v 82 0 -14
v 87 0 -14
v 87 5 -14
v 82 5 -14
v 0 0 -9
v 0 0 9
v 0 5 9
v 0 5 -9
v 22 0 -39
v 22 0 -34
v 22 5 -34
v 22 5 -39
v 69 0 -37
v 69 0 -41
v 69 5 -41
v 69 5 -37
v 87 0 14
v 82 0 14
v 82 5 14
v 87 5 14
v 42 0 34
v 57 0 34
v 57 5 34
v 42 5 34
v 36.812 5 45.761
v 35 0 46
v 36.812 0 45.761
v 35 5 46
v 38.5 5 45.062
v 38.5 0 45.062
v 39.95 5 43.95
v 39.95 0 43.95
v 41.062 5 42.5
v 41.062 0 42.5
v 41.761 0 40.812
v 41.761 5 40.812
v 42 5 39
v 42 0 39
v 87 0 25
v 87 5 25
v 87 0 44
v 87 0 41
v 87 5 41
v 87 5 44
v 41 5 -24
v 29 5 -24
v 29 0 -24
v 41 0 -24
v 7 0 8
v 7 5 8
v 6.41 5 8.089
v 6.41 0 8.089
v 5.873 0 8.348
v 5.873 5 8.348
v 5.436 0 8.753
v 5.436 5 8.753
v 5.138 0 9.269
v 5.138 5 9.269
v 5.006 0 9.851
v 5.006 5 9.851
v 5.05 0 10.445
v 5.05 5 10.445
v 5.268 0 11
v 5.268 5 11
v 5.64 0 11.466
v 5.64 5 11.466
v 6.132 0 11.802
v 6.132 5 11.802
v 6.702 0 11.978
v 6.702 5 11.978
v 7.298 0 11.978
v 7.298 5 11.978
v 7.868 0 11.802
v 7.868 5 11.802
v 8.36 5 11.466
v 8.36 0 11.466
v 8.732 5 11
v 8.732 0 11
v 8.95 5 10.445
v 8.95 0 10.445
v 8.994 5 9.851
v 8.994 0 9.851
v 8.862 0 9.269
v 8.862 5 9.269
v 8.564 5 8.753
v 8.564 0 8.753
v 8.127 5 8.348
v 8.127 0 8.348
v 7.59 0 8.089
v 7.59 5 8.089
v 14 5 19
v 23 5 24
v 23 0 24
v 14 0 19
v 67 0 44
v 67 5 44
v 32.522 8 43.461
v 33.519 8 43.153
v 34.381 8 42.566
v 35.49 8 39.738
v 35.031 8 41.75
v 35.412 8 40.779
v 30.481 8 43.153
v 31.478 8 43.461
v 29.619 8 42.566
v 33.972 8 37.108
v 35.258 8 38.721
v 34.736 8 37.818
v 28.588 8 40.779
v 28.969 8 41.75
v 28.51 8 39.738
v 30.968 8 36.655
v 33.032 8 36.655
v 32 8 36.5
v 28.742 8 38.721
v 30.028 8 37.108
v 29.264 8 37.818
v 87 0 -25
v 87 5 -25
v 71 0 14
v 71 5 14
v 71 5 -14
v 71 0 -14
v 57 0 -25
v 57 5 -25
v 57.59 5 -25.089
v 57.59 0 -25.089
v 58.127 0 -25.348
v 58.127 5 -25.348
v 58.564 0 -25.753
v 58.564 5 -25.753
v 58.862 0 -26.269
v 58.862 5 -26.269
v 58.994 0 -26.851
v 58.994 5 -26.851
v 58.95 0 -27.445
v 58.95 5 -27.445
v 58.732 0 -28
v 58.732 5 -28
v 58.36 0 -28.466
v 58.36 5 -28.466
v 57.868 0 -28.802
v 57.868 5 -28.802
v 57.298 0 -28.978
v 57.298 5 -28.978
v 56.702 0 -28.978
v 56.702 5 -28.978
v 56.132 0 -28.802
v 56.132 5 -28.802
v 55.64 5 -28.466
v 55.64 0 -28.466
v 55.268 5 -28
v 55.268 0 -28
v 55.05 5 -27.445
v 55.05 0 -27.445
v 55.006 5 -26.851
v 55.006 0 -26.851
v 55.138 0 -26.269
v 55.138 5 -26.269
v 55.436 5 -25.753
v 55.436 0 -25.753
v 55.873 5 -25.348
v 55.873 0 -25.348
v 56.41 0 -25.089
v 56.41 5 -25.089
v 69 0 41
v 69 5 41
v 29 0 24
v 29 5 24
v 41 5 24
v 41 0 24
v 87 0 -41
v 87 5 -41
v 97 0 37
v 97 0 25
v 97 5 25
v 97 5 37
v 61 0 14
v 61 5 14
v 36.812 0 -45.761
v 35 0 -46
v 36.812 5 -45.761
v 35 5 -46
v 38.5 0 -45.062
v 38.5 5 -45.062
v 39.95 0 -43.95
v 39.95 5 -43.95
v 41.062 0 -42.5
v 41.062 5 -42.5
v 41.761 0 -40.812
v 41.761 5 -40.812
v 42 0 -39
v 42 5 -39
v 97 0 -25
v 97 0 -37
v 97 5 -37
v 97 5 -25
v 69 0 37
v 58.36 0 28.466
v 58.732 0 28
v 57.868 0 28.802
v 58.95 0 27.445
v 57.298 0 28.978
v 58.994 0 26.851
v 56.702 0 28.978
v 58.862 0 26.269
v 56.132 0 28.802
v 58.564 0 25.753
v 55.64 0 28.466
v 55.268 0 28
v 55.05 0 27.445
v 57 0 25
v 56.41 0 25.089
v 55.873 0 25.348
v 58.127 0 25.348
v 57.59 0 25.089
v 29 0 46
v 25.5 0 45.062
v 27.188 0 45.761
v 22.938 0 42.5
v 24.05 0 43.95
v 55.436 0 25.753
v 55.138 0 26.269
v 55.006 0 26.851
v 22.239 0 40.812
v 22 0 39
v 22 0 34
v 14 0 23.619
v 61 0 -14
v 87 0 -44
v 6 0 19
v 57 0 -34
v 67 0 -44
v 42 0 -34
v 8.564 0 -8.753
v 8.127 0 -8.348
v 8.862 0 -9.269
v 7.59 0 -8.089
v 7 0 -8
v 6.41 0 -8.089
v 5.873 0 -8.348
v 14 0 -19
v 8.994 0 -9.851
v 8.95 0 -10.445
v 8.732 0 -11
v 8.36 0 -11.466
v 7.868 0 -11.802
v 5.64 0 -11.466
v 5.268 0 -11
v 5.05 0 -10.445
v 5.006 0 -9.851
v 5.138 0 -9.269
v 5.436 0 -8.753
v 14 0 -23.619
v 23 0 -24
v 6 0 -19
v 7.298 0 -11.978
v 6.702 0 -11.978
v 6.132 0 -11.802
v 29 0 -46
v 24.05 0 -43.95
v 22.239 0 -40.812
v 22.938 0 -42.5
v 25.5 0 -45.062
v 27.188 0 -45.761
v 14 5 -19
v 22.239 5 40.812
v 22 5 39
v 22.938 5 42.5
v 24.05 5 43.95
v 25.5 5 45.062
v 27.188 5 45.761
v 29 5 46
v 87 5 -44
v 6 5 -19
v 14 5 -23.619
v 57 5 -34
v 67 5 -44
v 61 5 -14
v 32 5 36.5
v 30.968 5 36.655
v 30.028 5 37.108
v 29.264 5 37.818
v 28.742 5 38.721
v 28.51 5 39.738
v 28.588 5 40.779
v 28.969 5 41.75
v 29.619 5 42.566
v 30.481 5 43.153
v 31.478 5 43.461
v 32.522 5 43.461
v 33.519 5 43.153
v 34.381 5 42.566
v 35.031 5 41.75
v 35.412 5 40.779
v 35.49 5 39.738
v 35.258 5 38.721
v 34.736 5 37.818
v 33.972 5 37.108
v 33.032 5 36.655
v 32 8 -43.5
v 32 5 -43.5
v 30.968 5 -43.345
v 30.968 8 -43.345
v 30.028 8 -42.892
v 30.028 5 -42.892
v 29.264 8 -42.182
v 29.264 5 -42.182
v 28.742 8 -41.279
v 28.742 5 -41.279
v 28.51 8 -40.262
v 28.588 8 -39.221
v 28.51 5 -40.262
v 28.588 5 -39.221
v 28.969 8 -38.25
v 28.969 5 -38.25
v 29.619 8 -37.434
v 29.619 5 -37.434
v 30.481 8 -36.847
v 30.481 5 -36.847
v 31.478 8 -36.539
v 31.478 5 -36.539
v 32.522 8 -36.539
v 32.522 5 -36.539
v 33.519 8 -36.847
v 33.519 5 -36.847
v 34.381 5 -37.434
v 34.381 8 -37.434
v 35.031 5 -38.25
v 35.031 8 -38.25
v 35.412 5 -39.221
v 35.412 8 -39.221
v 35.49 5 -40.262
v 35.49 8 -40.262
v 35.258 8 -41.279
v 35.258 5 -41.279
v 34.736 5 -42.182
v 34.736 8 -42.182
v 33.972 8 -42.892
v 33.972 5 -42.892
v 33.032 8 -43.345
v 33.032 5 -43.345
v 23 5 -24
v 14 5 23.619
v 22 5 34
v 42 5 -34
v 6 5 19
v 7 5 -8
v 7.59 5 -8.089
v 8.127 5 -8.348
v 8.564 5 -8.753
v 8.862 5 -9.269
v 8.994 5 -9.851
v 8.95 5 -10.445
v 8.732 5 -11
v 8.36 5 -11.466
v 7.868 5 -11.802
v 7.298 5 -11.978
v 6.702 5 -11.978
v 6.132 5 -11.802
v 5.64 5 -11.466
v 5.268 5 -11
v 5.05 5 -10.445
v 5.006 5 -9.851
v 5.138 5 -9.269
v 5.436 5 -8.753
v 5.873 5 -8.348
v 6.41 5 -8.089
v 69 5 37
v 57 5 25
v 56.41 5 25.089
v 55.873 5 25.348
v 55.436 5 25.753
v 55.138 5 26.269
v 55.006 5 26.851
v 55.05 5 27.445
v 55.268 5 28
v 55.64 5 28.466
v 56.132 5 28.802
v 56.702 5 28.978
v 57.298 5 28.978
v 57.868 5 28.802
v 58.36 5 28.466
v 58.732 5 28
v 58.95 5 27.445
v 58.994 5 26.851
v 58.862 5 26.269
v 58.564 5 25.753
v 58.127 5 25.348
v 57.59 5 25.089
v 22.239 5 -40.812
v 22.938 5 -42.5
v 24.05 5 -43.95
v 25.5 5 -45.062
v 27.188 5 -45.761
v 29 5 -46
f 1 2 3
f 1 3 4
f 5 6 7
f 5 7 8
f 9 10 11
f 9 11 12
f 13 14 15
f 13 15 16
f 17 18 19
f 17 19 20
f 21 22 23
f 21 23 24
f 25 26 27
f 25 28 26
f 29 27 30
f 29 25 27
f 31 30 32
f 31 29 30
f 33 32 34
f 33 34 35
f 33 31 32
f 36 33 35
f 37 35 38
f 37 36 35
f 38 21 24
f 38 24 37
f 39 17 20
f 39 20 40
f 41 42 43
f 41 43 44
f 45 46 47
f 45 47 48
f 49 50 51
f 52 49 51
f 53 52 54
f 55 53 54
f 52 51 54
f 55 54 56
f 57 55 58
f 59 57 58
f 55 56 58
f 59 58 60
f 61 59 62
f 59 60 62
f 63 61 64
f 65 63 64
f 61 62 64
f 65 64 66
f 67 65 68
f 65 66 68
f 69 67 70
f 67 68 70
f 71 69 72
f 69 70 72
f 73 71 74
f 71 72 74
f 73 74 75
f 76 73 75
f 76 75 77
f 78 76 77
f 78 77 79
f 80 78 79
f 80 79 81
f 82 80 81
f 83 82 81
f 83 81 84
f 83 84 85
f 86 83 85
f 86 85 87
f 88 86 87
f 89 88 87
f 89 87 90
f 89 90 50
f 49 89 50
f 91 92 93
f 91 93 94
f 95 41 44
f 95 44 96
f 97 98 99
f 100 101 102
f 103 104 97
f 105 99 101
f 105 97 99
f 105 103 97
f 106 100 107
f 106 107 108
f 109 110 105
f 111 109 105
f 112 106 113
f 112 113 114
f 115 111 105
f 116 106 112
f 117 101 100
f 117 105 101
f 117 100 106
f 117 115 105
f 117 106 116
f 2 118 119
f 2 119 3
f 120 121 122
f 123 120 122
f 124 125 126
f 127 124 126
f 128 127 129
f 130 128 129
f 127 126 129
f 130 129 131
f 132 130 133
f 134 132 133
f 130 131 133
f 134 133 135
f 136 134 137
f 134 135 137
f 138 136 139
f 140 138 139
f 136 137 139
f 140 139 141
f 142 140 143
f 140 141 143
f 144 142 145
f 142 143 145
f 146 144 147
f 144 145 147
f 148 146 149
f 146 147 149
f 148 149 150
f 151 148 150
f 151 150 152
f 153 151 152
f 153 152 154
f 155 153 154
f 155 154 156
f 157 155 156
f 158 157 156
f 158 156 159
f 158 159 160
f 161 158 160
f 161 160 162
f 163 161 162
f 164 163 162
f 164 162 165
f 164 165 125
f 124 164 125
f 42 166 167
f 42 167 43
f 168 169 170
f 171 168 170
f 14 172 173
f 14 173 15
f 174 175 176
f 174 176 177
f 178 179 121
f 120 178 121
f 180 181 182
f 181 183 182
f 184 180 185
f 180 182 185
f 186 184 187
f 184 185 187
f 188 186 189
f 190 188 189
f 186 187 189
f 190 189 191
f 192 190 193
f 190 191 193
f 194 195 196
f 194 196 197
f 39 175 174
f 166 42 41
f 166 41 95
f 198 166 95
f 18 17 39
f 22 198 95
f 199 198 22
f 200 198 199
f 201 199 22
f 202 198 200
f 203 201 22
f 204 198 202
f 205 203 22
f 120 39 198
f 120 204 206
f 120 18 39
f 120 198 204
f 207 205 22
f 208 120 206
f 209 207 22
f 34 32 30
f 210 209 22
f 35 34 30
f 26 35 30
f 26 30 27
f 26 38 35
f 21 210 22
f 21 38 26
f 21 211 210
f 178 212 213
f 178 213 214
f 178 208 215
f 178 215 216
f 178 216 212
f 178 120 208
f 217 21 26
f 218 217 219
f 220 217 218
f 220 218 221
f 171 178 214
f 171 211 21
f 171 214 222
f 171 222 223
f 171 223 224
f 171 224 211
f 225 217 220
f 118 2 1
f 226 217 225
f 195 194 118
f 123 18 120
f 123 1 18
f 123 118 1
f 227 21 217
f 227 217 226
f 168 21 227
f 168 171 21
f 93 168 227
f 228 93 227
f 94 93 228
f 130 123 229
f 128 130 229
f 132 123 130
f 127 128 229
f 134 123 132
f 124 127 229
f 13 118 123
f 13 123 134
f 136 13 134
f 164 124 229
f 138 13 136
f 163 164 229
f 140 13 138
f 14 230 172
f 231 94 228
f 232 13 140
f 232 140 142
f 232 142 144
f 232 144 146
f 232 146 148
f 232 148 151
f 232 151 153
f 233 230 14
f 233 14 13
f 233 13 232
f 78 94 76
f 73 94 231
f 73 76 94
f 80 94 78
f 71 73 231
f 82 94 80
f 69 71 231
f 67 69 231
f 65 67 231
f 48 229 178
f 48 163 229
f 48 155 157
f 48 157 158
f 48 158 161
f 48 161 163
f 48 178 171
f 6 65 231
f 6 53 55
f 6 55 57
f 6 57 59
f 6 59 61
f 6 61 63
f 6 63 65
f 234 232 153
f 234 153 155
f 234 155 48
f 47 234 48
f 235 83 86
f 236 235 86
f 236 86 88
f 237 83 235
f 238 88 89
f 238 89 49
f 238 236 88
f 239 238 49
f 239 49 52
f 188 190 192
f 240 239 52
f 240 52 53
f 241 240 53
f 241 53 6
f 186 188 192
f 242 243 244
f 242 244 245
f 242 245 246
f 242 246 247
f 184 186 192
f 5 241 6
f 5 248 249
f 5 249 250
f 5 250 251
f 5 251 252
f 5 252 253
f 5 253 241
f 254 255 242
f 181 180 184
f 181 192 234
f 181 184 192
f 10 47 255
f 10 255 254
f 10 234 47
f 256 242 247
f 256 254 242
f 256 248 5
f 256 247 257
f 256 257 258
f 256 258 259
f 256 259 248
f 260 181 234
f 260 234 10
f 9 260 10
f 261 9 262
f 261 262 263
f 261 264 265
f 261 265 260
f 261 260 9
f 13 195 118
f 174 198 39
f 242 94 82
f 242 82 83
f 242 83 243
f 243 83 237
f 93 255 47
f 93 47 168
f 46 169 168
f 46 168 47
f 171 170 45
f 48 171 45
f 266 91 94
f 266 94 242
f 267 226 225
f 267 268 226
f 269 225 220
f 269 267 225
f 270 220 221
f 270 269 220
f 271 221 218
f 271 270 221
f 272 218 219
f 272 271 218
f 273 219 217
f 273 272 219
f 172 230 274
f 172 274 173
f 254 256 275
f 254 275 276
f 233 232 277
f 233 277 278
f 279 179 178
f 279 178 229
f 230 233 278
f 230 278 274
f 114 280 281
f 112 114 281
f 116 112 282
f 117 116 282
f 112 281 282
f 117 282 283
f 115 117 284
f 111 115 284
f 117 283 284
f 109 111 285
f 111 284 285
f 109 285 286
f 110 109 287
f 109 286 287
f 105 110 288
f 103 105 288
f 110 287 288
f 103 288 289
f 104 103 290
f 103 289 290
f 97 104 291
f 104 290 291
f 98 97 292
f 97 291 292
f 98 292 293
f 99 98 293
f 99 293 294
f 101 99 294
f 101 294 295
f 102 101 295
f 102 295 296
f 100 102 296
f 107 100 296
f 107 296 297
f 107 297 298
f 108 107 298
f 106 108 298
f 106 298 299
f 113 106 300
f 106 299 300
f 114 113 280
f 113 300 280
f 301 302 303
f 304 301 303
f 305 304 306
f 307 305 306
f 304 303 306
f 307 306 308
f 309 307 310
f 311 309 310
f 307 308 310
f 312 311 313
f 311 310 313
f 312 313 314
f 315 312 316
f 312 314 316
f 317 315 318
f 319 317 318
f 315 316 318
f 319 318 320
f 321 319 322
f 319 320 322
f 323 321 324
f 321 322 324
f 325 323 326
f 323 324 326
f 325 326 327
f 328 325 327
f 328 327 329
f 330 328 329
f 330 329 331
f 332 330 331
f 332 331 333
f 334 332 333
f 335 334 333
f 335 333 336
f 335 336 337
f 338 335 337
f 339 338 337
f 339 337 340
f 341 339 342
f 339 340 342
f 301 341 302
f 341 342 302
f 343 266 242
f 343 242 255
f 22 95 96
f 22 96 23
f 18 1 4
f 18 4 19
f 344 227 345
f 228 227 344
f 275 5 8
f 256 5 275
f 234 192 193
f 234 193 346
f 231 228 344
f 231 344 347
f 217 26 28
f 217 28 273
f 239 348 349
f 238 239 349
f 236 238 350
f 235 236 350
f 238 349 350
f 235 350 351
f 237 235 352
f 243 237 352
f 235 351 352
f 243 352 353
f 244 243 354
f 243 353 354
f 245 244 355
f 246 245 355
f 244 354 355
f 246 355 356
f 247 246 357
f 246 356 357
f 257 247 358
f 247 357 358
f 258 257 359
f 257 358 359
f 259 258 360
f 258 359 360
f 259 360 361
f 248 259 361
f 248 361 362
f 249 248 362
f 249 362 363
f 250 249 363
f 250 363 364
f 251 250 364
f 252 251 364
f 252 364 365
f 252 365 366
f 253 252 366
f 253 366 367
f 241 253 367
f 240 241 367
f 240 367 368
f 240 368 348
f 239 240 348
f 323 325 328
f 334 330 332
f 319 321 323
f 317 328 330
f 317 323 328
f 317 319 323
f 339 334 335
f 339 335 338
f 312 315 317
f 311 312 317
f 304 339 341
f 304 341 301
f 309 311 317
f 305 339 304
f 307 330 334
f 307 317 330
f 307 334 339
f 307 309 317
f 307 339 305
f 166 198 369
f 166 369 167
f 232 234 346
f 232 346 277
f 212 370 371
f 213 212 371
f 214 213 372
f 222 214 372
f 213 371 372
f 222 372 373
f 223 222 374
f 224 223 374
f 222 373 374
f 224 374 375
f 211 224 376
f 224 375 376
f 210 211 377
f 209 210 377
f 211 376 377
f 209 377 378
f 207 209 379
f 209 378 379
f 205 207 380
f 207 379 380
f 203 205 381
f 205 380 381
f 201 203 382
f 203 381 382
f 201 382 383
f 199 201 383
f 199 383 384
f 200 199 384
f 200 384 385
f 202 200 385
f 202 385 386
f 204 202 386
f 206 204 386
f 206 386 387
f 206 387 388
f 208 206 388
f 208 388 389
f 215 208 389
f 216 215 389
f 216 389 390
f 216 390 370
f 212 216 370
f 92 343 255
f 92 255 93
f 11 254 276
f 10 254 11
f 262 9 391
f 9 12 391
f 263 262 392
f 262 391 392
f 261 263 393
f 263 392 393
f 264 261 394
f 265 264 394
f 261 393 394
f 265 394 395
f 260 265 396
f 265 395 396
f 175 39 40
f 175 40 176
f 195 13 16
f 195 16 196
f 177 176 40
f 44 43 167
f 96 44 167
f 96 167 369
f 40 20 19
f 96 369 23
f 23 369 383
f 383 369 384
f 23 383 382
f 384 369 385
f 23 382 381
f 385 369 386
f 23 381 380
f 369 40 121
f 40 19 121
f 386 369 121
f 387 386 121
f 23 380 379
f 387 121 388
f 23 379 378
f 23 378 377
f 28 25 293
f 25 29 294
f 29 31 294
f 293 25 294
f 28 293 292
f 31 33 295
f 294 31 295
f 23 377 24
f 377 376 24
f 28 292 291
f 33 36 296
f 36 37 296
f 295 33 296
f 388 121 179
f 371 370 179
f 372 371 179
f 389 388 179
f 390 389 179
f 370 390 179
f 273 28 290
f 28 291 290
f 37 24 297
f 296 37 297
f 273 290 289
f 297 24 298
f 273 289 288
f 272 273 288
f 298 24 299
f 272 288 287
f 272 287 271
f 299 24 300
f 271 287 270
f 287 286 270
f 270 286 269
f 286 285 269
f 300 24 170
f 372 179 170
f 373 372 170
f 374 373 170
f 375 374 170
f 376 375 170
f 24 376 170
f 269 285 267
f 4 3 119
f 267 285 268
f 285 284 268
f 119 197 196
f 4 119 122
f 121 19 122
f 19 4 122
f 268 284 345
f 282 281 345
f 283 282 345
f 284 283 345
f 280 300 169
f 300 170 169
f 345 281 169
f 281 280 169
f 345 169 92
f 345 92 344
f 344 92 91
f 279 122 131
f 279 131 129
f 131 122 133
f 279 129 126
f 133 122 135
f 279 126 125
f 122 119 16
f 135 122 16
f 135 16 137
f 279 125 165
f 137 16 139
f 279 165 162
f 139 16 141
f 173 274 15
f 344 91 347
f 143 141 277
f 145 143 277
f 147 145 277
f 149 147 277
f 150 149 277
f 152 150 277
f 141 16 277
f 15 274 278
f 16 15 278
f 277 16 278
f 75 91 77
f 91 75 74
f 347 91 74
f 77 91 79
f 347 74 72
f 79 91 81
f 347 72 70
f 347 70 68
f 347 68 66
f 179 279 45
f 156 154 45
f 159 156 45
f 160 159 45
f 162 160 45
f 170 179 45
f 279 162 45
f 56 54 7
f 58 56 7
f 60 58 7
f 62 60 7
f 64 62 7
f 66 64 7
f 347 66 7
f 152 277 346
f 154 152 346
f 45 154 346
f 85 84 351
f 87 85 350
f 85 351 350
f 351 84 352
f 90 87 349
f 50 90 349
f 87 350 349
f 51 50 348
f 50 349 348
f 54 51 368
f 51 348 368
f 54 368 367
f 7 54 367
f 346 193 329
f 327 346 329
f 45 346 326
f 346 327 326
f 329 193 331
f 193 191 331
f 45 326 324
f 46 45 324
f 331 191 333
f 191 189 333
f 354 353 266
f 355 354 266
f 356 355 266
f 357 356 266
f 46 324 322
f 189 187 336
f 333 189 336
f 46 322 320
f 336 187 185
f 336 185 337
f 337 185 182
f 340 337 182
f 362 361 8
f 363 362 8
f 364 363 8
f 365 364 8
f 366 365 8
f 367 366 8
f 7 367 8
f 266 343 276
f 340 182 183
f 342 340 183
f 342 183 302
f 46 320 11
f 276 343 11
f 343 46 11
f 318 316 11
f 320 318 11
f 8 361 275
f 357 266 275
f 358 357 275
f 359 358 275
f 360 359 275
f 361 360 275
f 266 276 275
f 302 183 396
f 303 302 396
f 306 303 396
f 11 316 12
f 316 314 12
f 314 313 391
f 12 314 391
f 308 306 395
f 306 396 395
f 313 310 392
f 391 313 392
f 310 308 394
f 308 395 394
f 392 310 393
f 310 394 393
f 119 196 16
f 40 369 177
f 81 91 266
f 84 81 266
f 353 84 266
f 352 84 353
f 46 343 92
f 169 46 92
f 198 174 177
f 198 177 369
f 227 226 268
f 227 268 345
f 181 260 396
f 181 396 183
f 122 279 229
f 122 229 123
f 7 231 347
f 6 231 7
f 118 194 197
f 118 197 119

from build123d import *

# Parameters (mm, degrees)
EXTRUDE_1_DEPTH     = 5
SKETCH_2_R          = 2
SKETCH_2_W          = 12
SKETCH_2_H          = 48
SKETCH_2_W_2        = 10
SKETCH_2_H_2        = 28
CUT_EXTRUDE_1_DEPTH = 44
SKETCH_3_R          = 3.5
EXTRUDE_2_DEPTH     = 3
FILLET_1_R          = 7


with BuildPart() as part:
    # 草图1 → 凸台-拉伸1 (new body)
    with BuildSketch(Plane(origin=(0, 0, 0), x_dir=(1, 0, 0), z_dir=(0, 1, 0))):
        Polygon((0, -9), (0, 9), (6, 19), (14, 23.618802154), (22, 34), (22, 46), (42, 46), (42, 34), (57, 34), (67, 44), (87, 44), (87, 41), (69, 41), (69, 37), (97, 37), (97, 25), (87, 25), (87, 14), (82, 14), (82, -14), (87, -14), (87, -25), (97, -25), (97, -37), (69, -37), (69, -41), (87, -41), (87, -44), (67, -44), (57, -34), (42, -34), (42, -46), (22, -46), (22, -34), (14, -23.618802154), (6, -19), align=None)
    extrude(amount=EXTRUDE_1_DEPTH)

    # 草图2 → 切除-拉伸1 (cut)
    with BuildSketch(Plane(origin=(0, 5, 0), x_dir=(1, 0, 0), z_dir=(0, 1, 0))):
        with Locations(Location((7, 10, 0), (0, 0, 270))):
            Circle(SKETCH_2_R)
        with Locations(Location((7, -10, 0), (0, 0, 90))):
            Circle(SKETCH_2_R)
        with Locations(Location((57, 27, 0), (0, 0, 270))):
            Circle(SKETCH_2_R)
        with Locations(Location((57, -27, 0), (0, 0, 90))):
            Circle(SKETCH_2_R)
        Polygon((14, -19), (14, 19), (23, 24), (23, -24), align=None)
        with Locations((35, 0)):
            Rectangle(SKETCH_2_W, SKETCH_2_H)
        with Locations((66, 0)):
            Rectangle(SKETCH_2_W_2, SKETCH_2_H_2)
    extrude(amount=-CUT_EXTRUDE_1_DEPTH, mode=Mode.SUBTRACT)

    # 草图3 → 凸台-拉伸2 (add)
    with BuildSketch(Plane(origin=(0, 5, 0), x_dir=(1, 0, 0), z_dir=(0, 1, 0))):
        with Locations(Location((32, 40, 0), (0, 0, 90))):
            Circle(SKETCH_3_R)
        with Locations(Location((32, -40, 0), (0, 0, 90))):
            Circle(SKETCH_3_R)
    extrude(amount=EXTRUDE_2_DEPTH)

    # 圆角1
    fillet_1_edges = [part.edges().sort_by_distance(p)[0] for p in [
        (22, 2.5, 46),
        (42, 2.5, 46),
        (42, 2.5, -46),
        (22, 2.5, -46),
    ]]
    fillet(fillet_1_edges, radius=FILLET_1_R)


solid = part.part
